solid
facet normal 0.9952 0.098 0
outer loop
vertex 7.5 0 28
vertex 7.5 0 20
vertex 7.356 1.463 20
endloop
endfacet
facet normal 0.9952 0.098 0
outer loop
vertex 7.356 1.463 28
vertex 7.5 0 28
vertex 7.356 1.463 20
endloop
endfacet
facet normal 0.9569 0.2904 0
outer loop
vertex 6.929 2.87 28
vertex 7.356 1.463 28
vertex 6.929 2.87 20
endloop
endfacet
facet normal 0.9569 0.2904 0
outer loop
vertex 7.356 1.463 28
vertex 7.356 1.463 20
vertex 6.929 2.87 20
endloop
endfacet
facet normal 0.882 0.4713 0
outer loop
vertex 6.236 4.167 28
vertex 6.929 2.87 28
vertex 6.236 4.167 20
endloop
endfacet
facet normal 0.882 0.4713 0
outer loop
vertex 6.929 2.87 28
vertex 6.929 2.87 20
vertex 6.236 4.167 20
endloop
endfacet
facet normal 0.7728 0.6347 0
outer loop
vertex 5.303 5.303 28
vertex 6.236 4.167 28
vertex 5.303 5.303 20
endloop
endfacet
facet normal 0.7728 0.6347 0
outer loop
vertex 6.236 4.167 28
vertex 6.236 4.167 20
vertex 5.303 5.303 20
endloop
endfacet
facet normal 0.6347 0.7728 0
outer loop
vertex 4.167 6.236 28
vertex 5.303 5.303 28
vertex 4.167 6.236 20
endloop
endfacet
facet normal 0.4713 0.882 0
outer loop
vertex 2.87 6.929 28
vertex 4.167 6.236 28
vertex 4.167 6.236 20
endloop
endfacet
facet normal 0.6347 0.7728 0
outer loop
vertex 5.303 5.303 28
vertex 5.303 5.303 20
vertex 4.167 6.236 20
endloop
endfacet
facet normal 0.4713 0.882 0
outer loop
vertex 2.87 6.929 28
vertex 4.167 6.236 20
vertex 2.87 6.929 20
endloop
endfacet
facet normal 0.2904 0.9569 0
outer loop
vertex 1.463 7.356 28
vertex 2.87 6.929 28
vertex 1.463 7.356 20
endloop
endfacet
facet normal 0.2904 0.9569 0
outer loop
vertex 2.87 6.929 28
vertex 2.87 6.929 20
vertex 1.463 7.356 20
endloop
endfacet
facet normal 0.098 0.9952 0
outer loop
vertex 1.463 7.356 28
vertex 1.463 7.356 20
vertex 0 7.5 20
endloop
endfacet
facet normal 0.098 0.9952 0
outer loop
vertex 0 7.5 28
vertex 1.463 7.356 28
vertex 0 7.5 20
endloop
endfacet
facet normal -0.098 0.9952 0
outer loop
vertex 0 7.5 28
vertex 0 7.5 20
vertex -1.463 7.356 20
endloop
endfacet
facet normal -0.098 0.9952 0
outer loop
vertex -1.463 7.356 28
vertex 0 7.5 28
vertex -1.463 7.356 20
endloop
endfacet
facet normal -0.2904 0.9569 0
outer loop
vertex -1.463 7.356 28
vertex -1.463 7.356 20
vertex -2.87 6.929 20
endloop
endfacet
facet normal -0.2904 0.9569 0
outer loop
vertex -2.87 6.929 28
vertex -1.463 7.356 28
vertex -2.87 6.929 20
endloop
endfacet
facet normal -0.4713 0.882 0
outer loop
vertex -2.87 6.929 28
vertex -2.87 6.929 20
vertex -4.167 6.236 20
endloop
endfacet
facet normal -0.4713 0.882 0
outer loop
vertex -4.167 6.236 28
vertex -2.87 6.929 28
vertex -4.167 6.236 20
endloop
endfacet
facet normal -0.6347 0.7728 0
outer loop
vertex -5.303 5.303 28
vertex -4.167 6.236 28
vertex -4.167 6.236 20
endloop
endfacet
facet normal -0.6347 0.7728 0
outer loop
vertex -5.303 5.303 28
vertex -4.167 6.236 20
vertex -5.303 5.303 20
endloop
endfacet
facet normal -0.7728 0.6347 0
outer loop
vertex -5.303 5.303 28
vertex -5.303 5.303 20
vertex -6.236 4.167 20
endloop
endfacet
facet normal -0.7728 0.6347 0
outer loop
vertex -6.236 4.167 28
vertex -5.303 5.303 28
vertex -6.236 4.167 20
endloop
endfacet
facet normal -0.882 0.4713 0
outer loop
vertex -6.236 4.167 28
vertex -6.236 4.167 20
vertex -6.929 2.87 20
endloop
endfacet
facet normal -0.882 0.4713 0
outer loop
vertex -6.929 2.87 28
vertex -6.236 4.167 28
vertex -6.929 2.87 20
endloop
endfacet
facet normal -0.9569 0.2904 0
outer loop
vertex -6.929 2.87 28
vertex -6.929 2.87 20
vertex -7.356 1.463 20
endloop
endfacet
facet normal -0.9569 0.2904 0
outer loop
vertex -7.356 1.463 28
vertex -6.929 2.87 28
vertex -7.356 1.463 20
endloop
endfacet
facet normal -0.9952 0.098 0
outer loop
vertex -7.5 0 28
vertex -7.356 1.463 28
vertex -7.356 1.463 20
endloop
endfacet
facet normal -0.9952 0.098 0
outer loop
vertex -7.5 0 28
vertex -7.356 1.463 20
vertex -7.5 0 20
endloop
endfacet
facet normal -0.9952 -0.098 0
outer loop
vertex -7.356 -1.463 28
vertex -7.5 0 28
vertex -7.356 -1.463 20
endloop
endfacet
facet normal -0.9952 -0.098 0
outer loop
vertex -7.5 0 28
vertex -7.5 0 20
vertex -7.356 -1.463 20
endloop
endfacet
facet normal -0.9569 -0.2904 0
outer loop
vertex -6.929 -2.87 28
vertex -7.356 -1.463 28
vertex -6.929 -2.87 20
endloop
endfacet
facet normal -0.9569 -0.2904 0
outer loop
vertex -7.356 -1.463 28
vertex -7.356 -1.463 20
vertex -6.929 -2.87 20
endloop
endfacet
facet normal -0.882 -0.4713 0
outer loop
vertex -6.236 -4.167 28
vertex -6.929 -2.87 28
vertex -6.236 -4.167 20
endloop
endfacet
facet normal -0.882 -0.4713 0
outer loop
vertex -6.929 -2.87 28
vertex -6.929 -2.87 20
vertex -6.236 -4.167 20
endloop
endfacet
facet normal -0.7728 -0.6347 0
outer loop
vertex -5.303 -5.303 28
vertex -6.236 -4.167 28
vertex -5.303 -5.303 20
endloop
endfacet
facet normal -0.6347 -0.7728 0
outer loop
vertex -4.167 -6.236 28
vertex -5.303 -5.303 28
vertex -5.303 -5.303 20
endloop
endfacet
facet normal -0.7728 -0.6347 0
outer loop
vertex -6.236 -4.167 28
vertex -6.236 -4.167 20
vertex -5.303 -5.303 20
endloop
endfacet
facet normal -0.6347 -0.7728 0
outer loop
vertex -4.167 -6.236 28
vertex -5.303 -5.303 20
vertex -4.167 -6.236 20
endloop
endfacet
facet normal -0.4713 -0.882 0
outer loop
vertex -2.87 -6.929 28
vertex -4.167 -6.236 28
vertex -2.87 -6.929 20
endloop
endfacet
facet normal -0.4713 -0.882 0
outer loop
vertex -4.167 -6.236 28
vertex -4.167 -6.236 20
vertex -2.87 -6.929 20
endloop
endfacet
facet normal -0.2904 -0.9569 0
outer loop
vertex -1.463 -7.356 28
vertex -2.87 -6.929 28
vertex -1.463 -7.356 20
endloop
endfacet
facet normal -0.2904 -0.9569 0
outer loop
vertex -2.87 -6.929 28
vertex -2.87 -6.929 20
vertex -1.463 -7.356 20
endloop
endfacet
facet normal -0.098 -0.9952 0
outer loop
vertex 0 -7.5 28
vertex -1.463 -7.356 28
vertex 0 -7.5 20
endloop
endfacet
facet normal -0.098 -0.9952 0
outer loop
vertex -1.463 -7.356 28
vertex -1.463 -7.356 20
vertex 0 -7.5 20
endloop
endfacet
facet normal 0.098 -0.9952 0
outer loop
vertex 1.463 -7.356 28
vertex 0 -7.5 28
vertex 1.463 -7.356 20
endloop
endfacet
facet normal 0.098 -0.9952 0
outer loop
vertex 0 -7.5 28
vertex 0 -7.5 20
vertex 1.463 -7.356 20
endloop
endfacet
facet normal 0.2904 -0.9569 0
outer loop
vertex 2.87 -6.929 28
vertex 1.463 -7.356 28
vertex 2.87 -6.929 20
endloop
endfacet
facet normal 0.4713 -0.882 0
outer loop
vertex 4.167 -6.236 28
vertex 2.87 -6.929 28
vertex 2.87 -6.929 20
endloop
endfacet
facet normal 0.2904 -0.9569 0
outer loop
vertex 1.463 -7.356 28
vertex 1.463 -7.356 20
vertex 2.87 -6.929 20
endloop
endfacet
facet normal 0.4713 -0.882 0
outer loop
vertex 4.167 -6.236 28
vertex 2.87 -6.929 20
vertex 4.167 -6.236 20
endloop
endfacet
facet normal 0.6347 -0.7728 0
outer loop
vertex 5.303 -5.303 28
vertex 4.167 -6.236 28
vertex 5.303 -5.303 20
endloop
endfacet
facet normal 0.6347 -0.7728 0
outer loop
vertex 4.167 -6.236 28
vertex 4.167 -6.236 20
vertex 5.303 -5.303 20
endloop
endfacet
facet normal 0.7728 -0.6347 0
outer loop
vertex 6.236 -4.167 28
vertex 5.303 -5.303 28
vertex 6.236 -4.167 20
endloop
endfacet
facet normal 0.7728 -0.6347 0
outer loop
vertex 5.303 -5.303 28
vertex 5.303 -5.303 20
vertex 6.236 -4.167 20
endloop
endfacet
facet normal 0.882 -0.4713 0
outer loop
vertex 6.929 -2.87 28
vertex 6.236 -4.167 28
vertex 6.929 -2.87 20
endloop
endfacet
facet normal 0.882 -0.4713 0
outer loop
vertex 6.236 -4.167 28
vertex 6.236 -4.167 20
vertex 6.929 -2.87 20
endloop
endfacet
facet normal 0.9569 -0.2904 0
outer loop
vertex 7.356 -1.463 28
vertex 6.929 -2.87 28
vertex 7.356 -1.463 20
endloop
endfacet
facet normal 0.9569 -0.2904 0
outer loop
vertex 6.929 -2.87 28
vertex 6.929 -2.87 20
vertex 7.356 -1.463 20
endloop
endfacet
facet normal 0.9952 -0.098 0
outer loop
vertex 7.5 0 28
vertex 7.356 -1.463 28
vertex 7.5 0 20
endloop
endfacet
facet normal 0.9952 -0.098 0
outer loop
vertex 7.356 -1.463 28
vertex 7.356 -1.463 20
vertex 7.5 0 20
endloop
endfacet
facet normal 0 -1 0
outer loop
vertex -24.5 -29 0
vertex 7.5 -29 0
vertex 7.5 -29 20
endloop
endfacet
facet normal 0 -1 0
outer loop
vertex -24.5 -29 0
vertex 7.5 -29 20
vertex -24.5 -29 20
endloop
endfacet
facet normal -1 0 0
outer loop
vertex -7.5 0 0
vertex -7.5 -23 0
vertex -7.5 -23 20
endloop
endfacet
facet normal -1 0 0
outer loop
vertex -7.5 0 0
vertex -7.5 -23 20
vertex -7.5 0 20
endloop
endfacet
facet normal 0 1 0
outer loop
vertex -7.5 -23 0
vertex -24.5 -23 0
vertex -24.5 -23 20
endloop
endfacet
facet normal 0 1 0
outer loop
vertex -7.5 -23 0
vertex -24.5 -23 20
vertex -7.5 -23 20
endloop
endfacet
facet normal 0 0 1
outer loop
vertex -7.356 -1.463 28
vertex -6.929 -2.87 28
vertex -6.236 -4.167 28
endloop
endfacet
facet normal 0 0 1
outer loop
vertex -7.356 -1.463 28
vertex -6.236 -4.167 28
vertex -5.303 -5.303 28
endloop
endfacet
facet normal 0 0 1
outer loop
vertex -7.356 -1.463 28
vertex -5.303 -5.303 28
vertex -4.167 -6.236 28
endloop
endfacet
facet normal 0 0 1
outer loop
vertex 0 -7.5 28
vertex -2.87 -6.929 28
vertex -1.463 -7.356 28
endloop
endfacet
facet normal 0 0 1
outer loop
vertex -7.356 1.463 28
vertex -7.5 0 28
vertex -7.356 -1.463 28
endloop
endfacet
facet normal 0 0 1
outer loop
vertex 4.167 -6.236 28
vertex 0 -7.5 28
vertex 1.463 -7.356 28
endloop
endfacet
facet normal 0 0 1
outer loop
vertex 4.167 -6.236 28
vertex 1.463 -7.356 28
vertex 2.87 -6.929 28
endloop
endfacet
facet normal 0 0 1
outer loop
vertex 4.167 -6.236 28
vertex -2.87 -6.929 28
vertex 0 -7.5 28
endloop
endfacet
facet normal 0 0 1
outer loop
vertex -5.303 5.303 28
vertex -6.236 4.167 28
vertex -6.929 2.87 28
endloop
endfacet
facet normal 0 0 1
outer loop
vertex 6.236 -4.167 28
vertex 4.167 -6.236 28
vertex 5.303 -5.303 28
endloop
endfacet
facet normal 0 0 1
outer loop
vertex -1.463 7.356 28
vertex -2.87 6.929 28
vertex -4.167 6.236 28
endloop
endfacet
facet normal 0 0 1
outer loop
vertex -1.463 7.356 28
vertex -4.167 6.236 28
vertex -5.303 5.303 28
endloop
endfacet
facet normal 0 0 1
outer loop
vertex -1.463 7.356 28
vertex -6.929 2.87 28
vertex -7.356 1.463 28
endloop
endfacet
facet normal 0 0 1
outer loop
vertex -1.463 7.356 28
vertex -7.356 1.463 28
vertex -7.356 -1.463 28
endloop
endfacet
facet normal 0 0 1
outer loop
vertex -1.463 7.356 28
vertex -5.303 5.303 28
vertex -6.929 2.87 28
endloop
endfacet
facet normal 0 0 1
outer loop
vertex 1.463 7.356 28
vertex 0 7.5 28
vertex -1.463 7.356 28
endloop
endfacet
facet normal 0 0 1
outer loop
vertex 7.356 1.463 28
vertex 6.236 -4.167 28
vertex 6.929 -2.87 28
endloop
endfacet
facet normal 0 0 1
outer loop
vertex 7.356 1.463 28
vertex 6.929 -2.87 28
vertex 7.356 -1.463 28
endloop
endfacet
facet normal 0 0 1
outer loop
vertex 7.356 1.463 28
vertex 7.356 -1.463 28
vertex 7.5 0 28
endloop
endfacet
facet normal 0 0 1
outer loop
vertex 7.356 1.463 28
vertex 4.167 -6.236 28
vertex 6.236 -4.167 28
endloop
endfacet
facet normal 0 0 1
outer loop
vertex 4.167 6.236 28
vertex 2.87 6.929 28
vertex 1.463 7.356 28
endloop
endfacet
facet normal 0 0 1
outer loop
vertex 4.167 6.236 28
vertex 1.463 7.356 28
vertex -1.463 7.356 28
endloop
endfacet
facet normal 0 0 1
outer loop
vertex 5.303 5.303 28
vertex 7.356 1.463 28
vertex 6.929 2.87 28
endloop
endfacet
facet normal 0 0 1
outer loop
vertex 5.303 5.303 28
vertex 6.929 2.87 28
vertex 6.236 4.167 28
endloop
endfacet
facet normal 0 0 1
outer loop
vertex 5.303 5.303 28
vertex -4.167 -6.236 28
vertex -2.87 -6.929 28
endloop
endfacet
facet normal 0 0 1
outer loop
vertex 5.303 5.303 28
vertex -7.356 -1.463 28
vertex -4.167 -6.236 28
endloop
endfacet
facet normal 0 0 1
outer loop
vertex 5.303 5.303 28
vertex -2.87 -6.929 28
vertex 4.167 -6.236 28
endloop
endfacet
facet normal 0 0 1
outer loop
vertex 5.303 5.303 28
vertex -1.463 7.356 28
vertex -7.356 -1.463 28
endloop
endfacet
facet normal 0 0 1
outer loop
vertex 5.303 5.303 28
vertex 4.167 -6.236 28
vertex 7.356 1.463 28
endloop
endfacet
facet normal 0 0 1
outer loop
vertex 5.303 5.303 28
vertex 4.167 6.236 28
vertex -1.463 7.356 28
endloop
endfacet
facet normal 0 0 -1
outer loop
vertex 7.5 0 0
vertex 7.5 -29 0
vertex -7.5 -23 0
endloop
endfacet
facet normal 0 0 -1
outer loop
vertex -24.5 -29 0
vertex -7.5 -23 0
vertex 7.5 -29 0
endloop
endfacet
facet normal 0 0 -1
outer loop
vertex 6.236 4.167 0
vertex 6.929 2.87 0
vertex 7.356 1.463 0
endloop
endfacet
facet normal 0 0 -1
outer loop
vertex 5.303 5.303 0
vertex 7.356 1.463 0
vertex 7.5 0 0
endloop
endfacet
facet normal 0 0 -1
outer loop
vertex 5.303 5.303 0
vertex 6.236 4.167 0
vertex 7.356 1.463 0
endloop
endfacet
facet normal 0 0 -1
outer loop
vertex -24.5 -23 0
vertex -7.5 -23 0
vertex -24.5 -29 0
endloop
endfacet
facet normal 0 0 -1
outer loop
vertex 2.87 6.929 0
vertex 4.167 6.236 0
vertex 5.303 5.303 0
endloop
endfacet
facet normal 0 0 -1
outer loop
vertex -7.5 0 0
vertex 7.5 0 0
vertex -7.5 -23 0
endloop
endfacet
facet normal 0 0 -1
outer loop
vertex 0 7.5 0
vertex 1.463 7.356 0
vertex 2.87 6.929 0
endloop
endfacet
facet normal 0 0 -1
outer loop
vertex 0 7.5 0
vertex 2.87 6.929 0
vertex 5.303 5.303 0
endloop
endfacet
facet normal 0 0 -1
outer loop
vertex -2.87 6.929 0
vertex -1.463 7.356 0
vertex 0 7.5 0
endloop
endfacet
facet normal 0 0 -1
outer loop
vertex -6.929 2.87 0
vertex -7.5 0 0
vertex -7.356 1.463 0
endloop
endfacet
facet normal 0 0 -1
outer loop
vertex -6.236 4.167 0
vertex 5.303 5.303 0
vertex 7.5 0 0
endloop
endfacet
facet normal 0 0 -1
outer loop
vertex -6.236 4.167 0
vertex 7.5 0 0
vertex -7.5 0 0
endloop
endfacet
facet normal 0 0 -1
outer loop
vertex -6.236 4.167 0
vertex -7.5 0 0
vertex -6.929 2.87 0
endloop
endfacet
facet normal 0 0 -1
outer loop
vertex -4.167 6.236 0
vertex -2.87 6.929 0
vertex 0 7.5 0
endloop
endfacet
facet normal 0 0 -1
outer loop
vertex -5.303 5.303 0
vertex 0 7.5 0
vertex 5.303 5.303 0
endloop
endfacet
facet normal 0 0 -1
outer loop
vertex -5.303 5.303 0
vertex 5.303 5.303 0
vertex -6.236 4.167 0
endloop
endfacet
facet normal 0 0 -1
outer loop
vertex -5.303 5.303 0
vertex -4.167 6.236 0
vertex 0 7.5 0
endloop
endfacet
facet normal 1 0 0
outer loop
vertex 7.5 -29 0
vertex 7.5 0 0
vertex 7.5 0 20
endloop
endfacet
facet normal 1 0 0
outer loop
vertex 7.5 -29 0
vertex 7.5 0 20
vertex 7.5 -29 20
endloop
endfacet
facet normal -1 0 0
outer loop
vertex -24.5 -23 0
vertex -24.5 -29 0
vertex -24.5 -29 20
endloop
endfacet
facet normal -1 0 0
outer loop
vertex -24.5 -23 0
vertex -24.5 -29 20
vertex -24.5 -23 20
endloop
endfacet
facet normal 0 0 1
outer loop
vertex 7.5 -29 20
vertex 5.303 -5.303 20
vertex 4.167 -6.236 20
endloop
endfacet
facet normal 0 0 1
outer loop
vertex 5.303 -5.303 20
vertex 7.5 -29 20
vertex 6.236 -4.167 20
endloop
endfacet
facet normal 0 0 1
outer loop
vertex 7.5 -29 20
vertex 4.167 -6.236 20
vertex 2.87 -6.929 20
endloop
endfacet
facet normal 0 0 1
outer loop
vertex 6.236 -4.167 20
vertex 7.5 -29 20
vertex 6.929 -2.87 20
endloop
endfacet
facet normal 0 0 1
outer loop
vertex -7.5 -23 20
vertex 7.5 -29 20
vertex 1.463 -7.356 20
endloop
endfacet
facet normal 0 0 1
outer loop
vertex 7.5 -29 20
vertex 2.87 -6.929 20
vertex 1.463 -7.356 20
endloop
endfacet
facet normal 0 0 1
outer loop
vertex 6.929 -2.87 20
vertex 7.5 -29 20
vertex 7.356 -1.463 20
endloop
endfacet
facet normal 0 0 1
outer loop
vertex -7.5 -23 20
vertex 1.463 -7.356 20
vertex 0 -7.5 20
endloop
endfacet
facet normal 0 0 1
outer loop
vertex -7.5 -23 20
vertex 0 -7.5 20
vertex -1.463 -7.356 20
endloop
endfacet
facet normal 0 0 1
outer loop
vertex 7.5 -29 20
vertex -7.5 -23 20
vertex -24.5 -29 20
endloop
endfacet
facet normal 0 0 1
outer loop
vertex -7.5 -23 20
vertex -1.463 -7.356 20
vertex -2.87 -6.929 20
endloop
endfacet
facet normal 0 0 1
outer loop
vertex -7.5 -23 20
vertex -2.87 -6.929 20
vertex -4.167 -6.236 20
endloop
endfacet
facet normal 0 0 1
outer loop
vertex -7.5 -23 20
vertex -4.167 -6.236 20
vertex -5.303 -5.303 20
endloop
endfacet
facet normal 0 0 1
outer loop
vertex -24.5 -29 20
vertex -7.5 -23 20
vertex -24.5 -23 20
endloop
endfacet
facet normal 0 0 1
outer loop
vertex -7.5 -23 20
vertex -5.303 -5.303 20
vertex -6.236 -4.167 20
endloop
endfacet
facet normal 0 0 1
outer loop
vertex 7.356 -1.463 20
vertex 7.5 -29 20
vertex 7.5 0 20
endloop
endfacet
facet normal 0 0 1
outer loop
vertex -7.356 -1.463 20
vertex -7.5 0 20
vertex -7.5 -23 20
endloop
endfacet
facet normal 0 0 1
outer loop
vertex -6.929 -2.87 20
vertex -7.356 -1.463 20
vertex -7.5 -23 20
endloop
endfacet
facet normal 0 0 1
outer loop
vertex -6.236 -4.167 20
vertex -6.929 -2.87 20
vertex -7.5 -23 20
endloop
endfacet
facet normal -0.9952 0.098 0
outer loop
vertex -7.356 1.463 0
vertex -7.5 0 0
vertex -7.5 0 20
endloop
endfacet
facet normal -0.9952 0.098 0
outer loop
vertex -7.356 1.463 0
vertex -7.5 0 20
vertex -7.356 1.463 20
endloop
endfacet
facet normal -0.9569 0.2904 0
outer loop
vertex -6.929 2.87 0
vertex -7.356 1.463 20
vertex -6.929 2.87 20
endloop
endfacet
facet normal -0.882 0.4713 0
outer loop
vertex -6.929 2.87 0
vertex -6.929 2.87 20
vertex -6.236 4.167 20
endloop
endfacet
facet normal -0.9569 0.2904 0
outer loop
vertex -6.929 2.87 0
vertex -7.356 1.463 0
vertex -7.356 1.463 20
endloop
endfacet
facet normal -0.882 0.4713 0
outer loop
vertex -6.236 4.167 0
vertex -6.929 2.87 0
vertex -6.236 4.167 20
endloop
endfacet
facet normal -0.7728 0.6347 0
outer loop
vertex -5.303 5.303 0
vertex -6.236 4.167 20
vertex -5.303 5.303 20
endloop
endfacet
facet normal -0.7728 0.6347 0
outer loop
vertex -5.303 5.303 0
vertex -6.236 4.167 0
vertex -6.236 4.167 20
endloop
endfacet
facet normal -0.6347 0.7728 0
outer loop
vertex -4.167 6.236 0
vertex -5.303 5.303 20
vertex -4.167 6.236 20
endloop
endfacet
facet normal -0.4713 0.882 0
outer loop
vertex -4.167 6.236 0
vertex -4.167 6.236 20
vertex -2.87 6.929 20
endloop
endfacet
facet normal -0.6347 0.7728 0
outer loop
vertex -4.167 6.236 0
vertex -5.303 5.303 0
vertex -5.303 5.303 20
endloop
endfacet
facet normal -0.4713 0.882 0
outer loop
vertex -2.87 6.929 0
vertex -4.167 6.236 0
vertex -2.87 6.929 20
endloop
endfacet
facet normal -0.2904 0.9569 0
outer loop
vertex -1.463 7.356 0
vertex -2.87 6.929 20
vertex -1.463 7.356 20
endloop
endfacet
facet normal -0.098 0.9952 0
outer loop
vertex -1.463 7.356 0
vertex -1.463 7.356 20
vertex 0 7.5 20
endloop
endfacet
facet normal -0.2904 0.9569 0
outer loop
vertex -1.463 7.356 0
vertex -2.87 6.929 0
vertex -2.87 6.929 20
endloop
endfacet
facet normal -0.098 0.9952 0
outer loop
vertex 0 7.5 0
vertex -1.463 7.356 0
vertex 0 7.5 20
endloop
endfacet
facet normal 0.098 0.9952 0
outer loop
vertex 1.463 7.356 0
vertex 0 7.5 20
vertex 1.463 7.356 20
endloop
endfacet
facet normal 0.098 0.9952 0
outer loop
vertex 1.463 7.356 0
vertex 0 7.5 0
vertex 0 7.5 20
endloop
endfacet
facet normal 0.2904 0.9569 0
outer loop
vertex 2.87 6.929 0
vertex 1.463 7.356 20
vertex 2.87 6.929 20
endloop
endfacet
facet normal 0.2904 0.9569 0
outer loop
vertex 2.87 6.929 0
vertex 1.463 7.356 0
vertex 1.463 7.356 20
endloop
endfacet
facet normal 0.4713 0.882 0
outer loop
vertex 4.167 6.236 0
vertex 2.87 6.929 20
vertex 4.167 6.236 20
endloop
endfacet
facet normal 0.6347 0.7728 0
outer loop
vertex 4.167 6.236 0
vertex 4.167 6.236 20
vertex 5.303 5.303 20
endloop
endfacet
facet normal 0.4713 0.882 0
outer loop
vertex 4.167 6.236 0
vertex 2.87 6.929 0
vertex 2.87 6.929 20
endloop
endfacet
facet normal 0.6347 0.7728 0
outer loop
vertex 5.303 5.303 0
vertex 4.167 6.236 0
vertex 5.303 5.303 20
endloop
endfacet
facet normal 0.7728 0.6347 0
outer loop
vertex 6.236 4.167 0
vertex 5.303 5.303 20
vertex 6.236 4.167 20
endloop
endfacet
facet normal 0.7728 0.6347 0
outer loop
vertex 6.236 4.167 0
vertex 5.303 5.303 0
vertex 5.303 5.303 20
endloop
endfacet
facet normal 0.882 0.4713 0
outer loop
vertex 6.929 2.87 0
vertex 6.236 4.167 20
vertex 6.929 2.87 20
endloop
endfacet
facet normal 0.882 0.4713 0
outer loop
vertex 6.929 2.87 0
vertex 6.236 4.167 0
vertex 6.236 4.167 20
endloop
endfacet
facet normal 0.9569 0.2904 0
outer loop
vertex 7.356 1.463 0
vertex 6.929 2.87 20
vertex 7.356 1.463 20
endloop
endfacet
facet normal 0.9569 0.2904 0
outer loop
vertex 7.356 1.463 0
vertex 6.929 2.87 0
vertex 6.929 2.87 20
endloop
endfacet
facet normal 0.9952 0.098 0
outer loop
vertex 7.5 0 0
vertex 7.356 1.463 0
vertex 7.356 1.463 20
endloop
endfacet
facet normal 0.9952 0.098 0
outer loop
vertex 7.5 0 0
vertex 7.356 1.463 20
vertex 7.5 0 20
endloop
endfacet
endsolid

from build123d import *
from build123d.topology import SkipClean

# Parameters (mm, degrees)
BOSS_EXTRUDE1_DEPTH = 20
SKETCH3_R           = 7.5
BOSS_EXTRUDE3_DEPTH = 8


with BuildPart() as part:
    # Sketch1 → Boss-Extrude1 (new body)
    with BuildSketch(Plane.XY):
        with BuildLine():
            Line((7.5, 0), (7.5, -29))
            Line((7.5, -29), (-24.5, -29))
            Line((-24.5, -29), (-24.5, -23))
            Line((-24.5, -23), (-7.5, -23))
            Line((-7.5, -23), (-7.5, 0))
            ThreePointArc((-7.5, 0), (0, 7.5), (7.5, 0))
        make_face()
    extrude(amount=BOSS_EXTRUDE1_DEPTH)

    # Sketch3 → Boss-Extrude3 (add)
    with SkipClean():  # the faces are left unmerged after this step: merging them gives an invalid solid
        with BuildSketch(Plane.XY.offset(20)):
            Circle(SKETCH3_R)
        extrude(amount=BOSS_EXTRUDE3_DEPTH)
    add(part.part.scale(1), mode=Mode.REPLACE)  # the faces are merged on a copy


solid = part.part
